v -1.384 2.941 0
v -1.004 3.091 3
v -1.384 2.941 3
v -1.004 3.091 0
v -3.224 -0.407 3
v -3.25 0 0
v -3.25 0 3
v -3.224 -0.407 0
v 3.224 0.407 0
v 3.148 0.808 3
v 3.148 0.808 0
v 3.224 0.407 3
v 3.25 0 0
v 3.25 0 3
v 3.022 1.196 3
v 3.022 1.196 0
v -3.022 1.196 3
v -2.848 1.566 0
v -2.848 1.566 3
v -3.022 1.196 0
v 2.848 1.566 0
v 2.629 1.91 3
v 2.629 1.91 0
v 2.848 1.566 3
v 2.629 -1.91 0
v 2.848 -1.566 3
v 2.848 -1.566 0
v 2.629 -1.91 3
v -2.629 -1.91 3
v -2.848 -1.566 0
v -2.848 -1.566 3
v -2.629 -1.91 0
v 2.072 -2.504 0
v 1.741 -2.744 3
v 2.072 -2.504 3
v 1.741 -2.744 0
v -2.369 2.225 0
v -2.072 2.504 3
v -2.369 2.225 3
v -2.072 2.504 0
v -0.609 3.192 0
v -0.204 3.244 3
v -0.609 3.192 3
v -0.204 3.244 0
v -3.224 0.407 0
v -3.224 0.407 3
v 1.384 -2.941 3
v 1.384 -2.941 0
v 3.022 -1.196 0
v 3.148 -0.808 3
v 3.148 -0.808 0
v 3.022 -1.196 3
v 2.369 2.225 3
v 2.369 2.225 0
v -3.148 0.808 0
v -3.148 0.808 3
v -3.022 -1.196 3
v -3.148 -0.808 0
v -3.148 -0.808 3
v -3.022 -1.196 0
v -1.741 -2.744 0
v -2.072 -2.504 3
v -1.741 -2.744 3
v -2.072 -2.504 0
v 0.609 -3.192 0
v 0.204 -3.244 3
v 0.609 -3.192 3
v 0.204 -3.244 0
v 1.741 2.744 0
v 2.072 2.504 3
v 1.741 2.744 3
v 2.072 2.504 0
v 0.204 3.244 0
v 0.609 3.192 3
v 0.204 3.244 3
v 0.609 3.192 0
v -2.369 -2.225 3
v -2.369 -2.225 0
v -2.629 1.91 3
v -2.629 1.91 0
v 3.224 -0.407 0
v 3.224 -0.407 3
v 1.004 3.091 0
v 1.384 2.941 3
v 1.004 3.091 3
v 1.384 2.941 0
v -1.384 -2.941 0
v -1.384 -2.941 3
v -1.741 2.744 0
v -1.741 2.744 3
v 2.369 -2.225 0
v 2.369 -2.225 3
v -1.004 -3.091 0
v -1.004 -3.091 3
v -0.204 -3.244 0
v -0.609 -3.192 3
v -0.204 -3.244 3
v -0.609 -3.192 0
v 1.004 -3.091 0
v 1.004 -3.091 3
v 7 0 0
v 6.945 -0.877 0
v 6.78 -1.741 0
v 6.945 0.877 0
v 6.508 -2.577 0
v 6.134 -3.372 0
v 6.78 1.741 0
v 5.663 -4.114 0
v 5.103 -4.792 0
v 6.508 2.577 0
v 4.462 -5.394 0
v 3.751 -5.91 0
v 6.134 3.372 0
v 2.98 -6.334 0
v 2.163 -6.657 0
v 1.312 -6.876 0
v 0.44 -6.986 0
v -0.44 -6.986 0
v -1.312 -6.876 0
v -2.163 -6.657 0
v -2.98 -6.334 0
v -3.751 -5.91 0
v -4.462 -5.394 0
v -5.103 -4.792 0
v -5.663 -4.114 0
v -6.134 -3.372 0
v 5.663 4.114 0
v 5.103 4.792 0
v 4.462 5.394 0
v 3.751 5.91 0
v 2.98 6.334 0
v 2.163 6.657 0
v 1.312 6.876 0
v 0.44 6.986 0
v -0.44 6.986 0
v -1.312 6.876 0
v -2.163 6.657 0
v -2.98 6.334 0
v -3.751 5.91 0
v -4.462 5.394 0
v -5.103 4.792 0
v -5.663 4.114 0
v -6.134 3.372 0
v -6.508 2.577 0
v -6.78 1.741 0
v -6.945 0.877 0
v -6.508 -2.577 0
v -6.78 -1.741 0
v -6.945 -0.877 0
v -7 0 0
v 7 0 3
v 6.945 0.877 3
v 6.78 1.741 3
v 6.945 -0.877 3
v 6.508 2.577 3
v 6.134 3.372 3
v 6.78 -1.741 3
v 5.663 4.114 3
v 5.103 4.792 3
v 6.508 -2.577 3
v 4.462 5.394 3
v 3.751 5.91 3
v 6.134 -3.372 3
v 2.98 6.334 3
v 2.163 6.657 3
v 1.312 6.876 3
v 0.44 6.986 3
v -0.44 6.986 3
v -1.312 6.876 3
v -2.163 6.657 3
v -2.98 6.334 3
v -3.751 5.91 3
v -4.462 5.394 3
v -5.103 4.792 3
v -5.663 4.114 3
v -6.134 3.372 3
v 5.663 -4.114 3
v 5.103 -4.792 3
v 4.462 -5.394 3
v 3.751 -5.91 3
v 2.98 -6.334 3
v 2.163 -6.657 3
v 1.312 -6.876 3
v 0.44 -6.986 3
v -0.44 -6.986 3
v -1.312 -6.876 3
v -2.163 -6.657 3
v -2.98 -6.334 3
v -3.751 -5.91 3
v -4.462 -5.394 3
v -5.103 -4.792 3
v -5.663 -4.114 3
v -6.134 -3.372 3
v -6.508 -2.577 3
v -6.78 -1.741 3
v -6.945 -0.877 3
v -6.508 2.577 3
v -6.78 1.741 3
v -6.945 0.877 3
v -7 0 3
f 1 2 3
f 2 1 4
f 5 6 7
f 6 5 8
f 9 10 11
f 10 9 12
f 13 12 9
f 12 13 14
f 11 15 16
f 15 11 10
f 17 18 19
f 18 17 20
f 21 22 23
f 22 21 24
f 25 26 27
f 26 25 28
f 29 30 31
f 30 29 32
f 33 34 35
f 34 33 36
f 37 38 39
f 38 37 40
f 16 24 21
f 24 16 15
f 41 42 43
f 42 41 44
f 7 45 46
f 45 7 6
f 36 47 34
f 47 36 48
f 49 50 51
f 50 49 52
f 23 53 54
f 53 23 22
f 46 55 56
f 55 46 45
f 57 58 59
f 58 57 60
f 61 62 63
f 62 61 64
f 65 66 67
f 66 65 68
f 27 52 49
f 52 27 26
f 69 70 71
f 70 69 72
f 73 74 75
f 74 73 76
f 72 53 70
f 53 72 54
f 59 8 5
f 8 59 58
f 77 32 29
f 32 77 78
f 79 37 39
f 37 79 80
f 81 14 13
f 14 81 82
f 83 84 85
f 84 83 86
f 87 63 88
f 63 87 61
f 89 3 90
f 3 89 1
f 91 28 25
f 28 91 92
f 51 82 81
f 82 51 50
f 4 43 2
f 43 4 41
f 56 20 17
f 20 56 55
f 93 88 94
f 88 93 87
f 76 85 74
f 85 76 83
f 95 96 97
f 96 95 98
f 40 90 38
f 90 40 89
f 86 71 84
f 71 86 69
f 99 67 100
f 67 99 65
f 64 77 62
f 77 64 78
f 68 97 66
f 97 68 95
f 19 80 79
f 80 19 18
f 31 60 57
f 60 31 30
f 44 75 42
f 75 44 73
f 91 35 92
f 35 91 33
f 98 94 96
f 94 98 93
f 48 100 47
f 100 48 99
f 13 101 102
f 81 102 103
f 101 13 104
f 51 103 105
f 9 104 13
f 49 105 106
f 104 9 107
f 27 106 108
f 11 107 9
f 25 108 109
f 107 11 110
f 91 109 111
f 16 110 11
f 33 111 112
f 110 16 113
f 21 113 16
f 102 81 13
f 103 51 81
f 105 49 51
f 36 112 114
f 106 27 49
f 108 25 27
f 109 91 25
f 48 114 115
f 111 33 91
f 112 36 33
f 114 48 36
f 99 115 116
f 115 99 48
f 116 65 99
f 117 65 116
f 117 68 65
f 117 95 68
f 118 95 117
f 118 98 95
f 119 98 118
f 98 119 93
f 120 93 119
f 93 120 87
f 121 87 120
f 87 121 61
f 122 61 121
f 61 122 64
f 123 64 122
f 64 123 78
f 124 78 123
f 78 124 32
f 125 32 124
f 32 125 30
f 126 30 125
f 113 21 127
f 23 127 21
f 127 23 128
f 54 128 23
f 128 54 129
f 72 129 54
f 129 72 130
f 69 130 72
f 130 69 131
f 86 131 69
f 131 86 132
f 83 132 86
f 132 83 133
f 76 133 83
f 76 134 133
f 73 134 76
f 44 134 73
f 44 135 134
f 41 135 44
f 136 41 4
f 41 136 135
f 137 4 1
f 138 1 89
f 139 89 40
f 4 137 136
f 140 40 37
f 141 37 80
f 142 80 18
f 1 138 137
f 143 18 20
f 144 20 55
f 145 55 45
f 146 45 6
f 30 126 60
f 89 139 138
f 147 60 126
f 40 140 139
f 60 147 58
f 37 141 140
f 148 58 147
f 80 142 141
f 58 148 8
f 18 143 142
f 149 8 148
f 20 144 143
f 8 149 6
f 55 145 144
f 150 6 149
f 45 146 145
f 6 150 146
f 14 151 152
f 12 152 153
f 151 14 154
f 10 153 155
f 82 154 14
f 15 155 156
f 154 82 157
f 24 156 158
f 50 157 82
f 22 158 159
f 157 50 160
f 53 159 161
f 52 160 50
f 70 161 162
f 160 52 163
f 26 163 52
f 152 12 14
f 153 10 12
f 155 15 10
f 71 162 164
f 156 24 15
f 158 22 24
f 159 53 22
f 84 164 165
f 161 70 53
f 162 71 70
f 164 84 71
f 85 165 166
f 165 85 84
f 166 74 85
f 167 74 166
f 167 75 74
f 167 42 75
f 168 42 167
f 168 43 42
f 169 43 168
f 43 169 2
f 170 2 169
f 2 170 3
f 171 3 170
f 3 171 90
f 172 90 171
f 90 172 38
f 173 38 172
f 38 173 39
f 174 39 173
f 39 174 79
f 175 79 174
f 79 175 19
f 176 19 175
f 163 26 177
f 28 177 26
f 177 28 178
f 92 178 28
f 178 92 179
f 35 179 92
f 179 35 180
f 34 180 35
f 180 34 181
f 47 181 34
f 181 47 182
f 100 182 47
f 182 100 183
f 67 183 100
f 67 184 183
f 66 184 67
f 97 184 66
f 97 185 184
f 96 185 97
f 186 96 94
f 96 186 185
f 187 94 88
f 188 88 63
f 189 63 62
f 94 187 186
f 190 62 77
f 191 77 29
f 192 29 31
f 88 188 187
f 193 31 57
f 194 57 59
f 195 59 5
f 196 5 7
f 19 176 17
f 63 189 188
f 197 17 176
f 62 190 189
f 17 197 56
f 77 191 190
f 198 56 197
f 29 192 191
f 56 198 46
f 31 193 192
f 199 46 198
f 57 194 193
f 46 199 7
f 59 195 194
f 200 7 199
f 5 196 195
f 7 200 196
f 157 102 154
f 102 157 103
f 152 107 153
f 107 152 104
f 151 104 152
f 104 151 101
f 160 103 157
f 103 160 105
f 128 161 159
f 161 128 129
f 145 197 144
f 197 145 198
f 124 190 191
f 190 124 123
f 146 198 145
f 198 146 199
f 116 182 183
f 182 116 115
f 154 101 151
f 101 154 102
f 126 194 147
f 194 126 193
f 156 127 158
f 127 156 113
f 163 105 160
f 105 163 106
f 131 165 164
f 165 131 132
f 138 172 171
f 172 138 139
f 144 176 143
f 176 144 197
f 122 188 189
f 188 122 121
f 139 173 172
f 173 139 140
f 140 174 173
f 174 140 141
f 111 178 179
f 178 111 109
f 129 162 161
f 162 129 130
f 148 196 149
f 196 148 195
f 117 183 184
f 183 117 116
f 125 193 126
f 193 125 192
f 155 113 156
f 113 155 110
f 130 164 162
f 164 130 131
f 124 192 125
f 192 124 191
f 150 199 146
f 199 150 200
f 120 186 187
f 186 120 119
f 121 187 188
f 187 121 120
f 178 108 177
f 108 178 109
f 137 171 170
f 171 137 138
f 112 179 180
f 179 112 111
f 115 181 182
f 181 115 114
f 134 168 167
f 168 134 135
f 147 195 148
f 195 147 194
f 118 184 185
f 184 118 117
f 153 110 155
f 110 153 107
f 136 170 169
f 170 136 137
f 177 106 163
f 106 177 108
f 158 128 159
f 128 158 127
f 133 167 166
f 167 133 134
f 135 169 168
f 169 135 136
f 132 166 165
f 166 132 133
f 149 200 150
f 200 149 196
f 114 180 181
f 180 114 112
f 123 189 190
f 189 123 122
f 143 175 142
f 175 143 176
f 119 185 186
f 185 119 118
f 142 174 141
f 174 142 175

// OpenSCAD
$fn = 50;

difference() {
	union() {
		cylinder(h = 3, r = 7.0);
	}
	union() {
		cylinder(h = 3, r = 3.25);
		cylinder(h = 3, r = 1.8);
	}
}
